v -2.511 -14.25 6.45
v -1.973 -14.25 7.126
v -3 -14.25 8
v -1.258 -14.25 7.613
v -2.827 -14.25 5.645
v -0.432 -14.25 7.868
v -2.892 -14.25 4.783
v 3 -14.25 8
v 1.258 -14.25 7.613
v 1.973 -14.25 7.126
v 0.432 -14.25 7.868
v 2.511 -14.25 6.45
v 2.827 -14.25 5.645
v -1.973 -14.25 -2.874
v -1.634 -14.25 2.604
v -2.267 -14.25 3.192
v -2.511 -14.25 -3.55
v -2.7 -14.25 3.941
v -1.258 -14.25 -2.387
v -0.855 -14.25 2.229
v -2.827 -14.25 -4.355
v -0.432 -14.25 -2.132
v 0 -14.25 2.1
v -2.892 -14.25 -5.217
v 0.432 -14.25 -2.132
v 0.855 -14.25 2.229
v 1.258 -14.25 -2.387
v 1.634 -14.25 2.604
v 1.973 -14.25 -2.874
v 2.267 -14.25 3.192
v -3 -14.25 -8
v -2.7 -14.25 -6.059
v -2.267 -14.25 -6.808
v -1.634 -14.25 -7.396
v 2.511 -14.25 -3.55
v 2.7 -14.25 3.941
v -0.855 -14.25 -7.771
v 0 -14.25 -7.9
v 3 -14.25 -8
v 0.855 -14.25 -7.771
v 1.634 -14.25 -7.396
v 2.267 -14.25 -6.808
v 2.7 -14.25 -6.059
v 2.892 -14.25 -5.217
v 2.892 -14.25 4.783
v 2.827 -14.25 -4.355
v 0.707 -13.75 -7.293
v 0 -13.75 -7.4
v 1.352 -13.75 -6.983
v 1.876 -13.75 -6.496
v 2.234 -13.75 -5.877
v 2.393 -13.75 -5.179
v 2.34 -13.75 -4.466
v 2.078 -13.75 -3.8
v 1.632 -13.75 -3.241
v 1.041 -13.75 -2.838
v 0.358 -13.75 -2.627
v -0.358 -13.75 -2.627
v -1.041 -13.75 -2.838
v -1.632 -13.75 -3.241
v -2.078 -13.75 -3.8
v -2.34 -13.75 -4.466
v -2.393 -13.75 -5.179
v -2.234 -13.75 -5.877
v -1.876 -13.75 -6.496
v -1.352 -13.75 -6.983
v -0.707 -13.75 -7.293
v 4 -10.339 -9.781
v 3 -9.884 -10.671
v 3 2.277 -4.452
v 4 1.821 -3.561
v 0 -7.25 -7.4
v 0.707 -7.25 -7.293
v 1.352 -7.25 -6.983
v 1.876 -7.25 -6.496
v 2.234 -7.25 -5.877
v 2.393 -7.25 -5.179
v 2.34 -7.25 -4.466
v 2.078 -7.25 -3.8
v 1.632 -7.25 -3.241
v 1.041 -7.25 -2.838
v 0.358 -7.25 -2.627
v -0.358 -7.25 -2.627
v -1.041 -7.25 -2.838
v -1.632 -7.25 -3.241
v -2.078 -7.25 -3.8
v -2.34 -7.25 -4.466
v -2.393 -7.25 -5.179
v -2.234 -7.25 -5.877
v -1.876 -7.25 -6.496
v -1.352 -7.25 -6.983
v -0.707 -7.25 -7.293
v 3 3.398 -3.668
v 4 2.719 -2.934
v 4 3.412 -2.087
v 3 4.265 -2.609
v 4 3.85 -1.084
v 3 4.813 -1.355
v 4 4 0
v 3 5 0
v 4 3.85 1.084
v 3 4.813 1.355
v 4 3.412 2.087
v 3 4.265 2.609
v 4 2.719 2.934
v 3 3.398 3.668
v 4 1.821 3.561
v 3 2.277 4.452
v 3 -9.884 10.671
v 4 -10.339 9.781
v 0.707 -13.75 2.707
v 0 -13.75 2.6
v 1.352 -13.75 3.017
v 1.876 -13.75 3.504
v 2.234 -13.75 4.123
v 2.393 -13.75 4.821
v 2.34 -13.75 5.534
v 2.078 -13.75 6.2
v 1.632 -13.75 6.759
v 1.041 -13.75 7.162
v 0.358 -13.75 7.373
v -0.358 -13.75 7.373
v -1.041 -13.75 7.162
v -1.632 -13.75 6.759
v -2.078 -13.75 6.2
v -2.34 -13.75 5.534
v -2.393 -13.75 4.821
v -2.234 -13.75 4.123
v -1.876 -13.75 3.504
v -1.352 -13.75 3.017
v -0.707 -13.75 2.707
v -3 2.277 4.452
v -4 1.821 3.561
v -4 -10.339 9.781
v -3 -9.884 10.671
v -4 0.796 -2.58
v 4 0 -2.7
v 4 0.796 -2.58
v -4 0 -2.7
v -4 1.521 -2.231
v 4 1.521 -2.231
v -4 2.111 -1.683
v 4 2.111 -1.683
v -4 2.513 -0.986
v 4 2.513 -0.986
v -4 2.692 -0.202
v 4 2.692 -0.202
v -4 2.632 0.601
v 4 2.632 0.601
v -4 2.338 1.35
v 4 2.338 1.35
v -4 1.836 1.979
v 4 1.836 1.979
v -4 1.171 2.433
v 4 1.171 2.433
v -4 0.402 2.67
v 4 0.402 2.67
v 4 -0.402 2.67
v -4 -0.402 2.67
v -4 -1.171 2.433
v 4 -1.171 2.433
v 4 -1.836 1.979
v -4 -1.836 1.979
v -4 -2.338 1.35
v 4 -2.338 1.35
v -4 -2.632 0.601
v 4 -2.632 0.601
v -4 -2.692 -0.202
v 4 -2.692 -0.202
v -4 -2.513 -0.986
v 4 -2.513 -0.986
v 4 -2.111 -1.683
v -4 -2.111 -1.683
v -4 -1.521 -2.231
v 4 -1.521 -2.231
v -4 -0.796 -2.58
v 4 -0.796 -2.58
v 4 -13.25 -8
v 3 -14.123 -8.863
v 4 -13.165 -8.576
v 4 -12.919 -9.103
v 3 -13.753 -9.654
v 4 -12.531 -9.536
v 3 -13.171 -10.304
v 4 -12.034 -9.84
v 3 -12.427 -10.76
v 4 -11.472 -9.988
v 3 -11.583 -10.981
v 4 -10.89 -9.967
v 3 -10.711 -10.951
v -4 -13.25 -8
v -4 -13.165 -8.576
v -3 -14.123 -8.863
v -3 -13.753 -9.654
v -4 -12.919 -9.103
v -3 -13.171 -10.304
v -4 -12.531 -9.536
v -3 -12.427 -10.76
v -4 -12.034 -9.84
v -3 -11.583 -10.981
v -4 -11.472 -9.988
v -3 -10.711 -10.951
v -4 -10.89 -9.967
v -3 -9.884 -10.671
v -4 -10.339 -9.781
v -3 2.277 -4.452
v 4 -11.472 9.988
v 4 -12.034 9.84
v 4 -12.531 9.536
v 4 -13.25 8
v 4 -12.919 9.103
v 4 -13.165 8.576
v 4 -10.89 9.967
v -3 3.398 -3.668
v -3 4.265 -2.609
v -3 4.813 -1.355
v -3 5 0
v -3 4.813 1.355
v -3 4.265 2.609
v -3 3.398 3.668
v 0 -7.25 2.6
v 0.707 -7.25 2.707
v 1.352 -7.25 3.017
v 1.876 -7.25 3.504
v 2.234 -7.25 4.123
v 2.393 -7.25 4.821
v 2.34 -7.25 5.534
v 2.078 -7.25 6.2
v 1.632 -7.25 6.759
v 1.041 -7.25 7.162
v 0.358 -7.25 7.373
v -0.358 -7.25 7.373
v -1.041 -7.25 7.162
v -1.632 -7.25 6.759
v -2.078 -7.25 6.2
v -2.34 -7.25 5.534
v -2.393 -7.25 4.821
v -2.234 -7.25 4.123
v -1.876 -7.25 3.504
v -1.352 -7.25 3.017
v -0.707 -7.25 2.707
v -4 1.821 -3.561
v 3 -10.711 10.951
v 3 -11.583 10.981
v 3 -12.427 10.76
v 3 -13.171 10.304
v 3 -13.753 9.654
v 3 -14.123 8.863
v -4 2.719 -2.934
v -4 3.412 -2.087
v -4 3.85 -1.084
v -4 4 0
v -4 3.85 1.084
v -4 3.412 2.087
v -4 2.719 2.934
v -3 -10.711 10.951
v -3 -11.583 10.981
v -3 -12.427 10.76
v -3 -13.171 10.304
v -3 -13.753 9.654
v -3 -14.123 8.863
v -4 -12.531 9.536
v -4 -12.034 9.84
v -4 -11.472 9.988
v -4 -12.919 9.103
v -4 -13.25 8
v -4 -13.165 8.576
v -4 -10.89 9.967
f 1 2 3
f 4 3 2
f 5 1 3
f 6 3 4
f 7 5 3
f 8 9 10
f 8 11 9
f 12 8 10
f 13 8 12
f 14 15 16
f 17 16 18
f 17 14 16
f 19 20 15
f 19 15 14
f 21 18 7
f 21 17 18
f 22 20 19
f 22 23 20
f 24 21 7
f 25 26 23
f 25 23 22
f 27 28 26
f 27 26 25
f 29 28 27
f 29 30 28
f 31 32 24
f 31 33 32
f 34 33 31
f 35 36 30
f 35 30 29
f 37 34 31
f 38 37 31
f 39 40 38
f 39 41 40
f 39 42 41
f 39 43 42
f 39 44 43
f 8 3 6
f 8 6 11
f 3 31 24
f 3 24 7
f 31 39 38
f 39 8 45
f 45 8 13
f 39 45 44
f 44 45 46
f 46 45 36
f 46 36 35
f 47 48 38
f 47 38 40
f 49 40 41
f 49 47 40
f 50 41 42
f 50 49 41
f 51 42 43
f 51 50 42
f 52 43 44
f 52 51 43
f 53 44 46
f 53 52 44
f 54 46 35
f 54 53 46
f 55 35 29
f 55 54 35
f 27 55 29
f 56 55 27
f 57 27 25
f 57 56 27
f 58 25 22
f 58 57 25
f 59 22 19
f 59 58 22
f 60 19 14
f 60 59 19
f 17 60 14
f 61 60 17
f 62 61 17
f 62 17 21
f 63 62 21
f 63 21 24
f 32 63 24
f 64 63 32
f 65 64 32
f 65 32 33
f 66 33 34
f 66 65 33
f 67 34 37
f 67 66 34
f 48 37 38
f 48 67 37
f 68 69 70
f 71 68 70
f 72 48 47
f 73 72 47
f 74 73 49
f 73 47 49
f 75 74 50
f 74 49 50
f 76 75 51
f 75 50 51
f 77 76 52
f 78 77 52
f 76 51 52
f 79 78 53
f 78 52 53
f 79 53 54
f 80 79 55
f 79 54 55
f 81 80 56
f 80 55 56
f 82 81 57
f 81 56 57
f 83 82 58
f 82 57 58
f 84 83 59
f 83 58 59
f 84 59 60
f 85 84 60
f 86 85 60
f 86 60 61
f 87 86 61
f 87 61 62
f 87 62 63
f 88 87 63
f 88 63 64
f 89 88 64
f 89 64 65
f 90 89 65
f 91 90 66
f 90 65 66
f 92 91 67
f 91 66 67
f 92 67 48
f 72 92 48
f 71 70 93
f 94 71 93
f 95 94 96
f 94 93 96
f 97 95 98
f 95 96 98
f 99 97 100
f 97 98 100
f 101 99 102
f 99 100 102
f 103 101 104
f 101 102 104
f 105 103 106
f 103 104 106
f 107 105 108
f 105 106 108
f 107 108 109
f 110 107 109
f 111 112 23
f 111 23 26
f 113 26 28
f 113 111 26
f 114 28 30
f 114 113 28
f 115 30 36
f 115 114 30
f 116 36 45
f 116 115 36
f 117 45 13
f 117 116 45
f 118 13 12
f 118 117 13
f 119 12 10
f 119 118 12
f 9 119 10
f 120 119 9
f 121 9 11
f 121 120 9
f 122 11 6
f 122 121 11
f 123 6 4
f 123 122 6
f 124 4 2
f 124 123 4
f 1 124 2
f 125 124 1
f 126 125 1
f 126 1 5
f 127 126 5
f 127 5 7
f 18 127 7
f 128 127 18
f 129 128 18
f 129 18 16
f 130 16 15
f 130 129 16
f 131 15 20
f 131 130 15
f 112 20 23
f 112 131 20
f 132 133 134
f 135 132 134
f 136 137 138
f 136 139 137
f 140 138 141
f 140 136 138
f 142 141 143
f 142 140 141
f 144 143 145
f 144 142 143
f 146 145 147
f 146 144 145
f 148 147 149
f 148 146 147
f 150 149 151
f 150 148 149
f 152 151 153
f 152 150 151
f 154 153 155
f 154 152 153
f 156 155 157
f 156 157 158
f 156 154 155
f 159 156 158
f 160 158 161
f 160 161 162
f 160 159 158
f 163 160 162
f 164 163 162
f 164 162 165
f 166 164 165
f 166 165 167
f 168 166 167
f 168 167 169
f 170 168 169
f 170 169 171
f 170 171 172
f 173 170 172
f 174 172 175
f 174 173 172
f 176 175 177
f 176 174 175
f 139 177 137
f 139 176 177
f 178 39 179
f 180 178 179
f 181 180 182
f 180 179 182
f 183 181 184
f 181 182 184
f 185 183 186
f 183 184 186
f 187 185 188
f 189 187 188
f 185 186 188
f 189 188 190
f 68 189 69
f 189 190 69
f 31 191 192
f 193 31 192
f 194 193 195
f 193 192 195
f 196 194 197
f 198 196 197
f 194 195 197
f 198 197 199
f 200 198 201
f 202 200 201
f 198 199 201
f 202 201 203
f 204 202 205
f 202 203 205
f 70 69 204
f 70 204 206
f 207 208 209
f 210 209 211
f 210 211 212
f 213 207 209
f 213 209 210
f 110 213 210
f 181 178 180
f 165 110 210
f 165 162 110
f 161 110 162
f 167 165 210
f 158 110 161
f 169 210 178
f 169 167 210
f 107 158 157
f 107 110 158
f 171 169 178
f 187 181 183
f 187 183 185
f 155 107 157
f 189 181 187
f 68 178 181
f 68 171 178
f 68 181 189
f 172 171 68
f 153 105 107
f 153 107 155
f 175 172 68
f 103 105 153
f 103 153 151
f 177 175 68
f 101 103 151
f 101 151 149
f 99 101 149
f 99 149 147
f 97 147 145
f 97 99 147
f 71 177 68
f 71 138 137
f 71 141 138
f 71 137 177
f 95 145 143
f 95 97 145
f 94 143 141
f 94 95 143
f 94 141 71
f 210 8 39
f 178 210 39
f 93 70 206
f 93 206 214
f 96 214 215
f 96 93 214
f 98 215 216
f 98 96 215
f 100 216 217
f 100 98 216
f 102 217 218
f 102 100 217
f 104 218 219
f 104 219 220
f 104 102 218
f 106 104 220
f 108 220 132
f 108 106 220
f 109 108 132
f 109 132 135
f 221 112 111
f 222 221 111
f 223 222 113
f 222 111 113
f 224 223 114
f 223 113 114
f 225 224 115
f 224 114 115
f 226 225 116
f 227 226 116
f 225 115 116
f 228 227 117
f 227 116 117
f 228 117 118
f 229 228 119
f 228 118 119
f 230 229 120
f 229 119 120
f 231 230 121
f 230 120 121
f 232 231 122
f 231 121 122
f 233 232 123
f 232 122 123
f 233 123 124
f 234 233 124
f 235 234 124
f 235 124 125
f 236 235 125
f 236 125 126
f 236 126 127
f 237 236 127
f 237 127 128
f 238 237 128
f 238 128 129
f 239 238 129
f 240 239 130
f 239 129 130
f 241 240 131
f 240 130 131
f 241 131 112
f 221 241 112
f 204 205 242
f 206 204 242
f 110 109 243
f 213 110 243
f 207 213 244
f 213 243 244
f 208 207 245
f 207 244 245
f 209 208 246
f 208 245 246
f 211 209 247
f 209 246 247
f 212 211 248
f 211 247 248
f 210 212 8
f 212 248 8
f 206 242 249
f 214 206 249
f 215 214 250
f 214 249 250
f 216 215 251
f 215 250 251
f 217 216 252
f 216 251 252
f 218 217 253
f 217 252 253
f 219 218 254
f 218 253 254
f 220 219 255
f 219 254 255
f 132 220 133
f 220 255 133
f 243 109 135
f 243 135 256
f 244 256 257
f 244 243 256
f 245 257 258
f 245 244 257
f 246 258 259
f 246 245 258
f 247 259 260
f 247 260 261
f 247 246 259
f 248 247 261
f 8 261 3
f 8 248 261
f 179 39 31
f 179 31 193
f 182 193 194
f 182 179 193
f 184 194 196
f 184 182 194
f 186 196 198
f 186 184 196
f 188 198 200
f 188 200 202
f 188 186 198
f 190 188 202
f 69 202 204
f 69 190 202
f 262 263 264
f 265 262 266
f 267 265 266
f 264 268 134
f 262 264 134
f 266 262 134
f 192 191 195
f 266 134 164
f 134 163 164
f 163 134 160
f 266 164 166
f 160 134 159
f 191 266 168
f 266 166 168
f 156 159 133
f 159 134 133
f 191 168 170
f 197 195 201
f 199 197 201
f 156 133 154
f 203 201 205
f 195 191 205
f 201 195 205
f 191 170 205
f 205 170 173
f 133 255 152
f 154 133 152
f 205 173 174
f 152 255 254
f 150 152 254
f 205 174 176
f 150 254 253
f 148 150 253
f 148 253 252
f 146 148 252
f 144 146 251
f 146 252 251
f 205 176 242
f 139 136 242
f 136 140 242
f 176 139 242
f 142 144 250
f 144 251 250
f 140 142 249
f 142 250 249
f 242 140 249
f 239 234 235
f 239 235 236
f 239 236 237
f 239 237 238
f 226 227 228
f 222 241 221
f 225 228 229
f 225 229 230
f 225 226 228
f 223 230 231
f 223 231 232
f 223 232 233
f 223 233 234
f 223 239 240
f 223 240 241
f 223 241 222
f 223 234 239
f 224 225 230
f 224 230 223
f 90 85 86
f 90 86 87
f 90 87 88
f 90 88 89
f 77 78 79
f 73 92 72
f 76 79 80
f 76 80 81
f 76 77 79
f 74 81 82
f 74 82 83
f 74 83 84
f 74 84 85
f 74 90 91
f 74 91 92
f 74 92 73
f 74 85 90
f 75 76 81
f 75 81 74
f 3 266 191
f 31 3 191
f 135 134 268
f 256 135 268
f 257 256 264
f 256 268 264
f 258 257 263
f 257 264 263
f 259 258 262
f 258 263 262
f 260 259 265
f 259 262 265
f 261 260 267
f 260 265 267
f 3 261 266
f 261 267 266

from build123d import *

# Parameters (mm, degrees)
SKETCH1_R           = 2.7
BOSS_EXTRUDE1_DEPTH = 4
CHAMFER1_SIZE       = 1
SKETCH3_R           = 2.4
CUT_EXTRUDE1_DEPTH  = 7
CHAMFER2_SIZE       = 0.5


with BuildPart() as part:
    # Sketch1 → Boss-Extrude1 (new, symmetric)
    with BuildSketch(Plane(origin=(0, 0, 0), x_dir=(0, 0, -1), z_dir=(1, 0, 0))):
        with BuildLine():
            Line((-4.451593815, 2.276688935), (-10.670956289, -9.883986639))
            ThreePointArc((-10.670956289, -9.883986639), (-10.559105321, -12.815560589), (-8, -14.25))
            Line((-8, -14.25), (8, -14.25))
            ThreePointArc((8, -14.25), (10.559105321, -12.815560589), (10.670956289, -9.883986639))
            Line((10.670956289, -9.883986639), (4.451593815, 2.276688935))
            ThreePointArc((4.451593815, 2.276688935), (0, 5), (-4.451593815, 2.276688935))
        make_face()
        Circle(SKETCH1_R, mode=Mode.SUBTRACT)
    extrude(amount=BOSS_EXTRUDE1_DEPTH, both=True)

    # Chamfer1
    chamfer1_edges = [part.edges().sort_by_distance(p)[0] for p in [
        (4, -12.815560589, 10.559105321),
        (4, -14.25, 0),
        (4, -12.815560589, -10.559105321),
        (4, -3.803648852, -7.561275052),
        (4, 5, 0),
        (-4, -3.803648852, -7.561275052),
        (-4, -12.815560589, -10.559105321),
        (-4, -14.25, 0),
        (-4, -12.815560589, 10.559105321),
        (-4, -3.803648852, 7.561275052),
        (-4, 5, 0),
        (4, -3.803648852, 7.561275052),
    ]]
    chamfer(chamfer1_edges, length=CHAMFER1_SIZE)

    # Sketch3 → Cut-Extrude1 (cut)
    with BuildSketch(Plane.XZ.offset(14.25)):
        with Locations(Location((0, 5, 0), (0, 0, 270))):
            Circle(SKETCH3_R)
        with Locations(Location((0, -5, 0), (0, 0, 270))):
            Circle(SKETCH3_R)
    extrude(amount=-CUT_EXTRUDE1_DEPTH, mode=Mode.SUBTRACT)

    # Chamfer2
    chamfer2_edges = [part.edges().sort_by_distance(p)[0] for p in [
        (0, -14.25, 7.4),
        (0, -14.25, -2.6),
    ]]
    chamfer(chamfer2_edges, length=CHAMFER2_SIZE)


solid = part.part
